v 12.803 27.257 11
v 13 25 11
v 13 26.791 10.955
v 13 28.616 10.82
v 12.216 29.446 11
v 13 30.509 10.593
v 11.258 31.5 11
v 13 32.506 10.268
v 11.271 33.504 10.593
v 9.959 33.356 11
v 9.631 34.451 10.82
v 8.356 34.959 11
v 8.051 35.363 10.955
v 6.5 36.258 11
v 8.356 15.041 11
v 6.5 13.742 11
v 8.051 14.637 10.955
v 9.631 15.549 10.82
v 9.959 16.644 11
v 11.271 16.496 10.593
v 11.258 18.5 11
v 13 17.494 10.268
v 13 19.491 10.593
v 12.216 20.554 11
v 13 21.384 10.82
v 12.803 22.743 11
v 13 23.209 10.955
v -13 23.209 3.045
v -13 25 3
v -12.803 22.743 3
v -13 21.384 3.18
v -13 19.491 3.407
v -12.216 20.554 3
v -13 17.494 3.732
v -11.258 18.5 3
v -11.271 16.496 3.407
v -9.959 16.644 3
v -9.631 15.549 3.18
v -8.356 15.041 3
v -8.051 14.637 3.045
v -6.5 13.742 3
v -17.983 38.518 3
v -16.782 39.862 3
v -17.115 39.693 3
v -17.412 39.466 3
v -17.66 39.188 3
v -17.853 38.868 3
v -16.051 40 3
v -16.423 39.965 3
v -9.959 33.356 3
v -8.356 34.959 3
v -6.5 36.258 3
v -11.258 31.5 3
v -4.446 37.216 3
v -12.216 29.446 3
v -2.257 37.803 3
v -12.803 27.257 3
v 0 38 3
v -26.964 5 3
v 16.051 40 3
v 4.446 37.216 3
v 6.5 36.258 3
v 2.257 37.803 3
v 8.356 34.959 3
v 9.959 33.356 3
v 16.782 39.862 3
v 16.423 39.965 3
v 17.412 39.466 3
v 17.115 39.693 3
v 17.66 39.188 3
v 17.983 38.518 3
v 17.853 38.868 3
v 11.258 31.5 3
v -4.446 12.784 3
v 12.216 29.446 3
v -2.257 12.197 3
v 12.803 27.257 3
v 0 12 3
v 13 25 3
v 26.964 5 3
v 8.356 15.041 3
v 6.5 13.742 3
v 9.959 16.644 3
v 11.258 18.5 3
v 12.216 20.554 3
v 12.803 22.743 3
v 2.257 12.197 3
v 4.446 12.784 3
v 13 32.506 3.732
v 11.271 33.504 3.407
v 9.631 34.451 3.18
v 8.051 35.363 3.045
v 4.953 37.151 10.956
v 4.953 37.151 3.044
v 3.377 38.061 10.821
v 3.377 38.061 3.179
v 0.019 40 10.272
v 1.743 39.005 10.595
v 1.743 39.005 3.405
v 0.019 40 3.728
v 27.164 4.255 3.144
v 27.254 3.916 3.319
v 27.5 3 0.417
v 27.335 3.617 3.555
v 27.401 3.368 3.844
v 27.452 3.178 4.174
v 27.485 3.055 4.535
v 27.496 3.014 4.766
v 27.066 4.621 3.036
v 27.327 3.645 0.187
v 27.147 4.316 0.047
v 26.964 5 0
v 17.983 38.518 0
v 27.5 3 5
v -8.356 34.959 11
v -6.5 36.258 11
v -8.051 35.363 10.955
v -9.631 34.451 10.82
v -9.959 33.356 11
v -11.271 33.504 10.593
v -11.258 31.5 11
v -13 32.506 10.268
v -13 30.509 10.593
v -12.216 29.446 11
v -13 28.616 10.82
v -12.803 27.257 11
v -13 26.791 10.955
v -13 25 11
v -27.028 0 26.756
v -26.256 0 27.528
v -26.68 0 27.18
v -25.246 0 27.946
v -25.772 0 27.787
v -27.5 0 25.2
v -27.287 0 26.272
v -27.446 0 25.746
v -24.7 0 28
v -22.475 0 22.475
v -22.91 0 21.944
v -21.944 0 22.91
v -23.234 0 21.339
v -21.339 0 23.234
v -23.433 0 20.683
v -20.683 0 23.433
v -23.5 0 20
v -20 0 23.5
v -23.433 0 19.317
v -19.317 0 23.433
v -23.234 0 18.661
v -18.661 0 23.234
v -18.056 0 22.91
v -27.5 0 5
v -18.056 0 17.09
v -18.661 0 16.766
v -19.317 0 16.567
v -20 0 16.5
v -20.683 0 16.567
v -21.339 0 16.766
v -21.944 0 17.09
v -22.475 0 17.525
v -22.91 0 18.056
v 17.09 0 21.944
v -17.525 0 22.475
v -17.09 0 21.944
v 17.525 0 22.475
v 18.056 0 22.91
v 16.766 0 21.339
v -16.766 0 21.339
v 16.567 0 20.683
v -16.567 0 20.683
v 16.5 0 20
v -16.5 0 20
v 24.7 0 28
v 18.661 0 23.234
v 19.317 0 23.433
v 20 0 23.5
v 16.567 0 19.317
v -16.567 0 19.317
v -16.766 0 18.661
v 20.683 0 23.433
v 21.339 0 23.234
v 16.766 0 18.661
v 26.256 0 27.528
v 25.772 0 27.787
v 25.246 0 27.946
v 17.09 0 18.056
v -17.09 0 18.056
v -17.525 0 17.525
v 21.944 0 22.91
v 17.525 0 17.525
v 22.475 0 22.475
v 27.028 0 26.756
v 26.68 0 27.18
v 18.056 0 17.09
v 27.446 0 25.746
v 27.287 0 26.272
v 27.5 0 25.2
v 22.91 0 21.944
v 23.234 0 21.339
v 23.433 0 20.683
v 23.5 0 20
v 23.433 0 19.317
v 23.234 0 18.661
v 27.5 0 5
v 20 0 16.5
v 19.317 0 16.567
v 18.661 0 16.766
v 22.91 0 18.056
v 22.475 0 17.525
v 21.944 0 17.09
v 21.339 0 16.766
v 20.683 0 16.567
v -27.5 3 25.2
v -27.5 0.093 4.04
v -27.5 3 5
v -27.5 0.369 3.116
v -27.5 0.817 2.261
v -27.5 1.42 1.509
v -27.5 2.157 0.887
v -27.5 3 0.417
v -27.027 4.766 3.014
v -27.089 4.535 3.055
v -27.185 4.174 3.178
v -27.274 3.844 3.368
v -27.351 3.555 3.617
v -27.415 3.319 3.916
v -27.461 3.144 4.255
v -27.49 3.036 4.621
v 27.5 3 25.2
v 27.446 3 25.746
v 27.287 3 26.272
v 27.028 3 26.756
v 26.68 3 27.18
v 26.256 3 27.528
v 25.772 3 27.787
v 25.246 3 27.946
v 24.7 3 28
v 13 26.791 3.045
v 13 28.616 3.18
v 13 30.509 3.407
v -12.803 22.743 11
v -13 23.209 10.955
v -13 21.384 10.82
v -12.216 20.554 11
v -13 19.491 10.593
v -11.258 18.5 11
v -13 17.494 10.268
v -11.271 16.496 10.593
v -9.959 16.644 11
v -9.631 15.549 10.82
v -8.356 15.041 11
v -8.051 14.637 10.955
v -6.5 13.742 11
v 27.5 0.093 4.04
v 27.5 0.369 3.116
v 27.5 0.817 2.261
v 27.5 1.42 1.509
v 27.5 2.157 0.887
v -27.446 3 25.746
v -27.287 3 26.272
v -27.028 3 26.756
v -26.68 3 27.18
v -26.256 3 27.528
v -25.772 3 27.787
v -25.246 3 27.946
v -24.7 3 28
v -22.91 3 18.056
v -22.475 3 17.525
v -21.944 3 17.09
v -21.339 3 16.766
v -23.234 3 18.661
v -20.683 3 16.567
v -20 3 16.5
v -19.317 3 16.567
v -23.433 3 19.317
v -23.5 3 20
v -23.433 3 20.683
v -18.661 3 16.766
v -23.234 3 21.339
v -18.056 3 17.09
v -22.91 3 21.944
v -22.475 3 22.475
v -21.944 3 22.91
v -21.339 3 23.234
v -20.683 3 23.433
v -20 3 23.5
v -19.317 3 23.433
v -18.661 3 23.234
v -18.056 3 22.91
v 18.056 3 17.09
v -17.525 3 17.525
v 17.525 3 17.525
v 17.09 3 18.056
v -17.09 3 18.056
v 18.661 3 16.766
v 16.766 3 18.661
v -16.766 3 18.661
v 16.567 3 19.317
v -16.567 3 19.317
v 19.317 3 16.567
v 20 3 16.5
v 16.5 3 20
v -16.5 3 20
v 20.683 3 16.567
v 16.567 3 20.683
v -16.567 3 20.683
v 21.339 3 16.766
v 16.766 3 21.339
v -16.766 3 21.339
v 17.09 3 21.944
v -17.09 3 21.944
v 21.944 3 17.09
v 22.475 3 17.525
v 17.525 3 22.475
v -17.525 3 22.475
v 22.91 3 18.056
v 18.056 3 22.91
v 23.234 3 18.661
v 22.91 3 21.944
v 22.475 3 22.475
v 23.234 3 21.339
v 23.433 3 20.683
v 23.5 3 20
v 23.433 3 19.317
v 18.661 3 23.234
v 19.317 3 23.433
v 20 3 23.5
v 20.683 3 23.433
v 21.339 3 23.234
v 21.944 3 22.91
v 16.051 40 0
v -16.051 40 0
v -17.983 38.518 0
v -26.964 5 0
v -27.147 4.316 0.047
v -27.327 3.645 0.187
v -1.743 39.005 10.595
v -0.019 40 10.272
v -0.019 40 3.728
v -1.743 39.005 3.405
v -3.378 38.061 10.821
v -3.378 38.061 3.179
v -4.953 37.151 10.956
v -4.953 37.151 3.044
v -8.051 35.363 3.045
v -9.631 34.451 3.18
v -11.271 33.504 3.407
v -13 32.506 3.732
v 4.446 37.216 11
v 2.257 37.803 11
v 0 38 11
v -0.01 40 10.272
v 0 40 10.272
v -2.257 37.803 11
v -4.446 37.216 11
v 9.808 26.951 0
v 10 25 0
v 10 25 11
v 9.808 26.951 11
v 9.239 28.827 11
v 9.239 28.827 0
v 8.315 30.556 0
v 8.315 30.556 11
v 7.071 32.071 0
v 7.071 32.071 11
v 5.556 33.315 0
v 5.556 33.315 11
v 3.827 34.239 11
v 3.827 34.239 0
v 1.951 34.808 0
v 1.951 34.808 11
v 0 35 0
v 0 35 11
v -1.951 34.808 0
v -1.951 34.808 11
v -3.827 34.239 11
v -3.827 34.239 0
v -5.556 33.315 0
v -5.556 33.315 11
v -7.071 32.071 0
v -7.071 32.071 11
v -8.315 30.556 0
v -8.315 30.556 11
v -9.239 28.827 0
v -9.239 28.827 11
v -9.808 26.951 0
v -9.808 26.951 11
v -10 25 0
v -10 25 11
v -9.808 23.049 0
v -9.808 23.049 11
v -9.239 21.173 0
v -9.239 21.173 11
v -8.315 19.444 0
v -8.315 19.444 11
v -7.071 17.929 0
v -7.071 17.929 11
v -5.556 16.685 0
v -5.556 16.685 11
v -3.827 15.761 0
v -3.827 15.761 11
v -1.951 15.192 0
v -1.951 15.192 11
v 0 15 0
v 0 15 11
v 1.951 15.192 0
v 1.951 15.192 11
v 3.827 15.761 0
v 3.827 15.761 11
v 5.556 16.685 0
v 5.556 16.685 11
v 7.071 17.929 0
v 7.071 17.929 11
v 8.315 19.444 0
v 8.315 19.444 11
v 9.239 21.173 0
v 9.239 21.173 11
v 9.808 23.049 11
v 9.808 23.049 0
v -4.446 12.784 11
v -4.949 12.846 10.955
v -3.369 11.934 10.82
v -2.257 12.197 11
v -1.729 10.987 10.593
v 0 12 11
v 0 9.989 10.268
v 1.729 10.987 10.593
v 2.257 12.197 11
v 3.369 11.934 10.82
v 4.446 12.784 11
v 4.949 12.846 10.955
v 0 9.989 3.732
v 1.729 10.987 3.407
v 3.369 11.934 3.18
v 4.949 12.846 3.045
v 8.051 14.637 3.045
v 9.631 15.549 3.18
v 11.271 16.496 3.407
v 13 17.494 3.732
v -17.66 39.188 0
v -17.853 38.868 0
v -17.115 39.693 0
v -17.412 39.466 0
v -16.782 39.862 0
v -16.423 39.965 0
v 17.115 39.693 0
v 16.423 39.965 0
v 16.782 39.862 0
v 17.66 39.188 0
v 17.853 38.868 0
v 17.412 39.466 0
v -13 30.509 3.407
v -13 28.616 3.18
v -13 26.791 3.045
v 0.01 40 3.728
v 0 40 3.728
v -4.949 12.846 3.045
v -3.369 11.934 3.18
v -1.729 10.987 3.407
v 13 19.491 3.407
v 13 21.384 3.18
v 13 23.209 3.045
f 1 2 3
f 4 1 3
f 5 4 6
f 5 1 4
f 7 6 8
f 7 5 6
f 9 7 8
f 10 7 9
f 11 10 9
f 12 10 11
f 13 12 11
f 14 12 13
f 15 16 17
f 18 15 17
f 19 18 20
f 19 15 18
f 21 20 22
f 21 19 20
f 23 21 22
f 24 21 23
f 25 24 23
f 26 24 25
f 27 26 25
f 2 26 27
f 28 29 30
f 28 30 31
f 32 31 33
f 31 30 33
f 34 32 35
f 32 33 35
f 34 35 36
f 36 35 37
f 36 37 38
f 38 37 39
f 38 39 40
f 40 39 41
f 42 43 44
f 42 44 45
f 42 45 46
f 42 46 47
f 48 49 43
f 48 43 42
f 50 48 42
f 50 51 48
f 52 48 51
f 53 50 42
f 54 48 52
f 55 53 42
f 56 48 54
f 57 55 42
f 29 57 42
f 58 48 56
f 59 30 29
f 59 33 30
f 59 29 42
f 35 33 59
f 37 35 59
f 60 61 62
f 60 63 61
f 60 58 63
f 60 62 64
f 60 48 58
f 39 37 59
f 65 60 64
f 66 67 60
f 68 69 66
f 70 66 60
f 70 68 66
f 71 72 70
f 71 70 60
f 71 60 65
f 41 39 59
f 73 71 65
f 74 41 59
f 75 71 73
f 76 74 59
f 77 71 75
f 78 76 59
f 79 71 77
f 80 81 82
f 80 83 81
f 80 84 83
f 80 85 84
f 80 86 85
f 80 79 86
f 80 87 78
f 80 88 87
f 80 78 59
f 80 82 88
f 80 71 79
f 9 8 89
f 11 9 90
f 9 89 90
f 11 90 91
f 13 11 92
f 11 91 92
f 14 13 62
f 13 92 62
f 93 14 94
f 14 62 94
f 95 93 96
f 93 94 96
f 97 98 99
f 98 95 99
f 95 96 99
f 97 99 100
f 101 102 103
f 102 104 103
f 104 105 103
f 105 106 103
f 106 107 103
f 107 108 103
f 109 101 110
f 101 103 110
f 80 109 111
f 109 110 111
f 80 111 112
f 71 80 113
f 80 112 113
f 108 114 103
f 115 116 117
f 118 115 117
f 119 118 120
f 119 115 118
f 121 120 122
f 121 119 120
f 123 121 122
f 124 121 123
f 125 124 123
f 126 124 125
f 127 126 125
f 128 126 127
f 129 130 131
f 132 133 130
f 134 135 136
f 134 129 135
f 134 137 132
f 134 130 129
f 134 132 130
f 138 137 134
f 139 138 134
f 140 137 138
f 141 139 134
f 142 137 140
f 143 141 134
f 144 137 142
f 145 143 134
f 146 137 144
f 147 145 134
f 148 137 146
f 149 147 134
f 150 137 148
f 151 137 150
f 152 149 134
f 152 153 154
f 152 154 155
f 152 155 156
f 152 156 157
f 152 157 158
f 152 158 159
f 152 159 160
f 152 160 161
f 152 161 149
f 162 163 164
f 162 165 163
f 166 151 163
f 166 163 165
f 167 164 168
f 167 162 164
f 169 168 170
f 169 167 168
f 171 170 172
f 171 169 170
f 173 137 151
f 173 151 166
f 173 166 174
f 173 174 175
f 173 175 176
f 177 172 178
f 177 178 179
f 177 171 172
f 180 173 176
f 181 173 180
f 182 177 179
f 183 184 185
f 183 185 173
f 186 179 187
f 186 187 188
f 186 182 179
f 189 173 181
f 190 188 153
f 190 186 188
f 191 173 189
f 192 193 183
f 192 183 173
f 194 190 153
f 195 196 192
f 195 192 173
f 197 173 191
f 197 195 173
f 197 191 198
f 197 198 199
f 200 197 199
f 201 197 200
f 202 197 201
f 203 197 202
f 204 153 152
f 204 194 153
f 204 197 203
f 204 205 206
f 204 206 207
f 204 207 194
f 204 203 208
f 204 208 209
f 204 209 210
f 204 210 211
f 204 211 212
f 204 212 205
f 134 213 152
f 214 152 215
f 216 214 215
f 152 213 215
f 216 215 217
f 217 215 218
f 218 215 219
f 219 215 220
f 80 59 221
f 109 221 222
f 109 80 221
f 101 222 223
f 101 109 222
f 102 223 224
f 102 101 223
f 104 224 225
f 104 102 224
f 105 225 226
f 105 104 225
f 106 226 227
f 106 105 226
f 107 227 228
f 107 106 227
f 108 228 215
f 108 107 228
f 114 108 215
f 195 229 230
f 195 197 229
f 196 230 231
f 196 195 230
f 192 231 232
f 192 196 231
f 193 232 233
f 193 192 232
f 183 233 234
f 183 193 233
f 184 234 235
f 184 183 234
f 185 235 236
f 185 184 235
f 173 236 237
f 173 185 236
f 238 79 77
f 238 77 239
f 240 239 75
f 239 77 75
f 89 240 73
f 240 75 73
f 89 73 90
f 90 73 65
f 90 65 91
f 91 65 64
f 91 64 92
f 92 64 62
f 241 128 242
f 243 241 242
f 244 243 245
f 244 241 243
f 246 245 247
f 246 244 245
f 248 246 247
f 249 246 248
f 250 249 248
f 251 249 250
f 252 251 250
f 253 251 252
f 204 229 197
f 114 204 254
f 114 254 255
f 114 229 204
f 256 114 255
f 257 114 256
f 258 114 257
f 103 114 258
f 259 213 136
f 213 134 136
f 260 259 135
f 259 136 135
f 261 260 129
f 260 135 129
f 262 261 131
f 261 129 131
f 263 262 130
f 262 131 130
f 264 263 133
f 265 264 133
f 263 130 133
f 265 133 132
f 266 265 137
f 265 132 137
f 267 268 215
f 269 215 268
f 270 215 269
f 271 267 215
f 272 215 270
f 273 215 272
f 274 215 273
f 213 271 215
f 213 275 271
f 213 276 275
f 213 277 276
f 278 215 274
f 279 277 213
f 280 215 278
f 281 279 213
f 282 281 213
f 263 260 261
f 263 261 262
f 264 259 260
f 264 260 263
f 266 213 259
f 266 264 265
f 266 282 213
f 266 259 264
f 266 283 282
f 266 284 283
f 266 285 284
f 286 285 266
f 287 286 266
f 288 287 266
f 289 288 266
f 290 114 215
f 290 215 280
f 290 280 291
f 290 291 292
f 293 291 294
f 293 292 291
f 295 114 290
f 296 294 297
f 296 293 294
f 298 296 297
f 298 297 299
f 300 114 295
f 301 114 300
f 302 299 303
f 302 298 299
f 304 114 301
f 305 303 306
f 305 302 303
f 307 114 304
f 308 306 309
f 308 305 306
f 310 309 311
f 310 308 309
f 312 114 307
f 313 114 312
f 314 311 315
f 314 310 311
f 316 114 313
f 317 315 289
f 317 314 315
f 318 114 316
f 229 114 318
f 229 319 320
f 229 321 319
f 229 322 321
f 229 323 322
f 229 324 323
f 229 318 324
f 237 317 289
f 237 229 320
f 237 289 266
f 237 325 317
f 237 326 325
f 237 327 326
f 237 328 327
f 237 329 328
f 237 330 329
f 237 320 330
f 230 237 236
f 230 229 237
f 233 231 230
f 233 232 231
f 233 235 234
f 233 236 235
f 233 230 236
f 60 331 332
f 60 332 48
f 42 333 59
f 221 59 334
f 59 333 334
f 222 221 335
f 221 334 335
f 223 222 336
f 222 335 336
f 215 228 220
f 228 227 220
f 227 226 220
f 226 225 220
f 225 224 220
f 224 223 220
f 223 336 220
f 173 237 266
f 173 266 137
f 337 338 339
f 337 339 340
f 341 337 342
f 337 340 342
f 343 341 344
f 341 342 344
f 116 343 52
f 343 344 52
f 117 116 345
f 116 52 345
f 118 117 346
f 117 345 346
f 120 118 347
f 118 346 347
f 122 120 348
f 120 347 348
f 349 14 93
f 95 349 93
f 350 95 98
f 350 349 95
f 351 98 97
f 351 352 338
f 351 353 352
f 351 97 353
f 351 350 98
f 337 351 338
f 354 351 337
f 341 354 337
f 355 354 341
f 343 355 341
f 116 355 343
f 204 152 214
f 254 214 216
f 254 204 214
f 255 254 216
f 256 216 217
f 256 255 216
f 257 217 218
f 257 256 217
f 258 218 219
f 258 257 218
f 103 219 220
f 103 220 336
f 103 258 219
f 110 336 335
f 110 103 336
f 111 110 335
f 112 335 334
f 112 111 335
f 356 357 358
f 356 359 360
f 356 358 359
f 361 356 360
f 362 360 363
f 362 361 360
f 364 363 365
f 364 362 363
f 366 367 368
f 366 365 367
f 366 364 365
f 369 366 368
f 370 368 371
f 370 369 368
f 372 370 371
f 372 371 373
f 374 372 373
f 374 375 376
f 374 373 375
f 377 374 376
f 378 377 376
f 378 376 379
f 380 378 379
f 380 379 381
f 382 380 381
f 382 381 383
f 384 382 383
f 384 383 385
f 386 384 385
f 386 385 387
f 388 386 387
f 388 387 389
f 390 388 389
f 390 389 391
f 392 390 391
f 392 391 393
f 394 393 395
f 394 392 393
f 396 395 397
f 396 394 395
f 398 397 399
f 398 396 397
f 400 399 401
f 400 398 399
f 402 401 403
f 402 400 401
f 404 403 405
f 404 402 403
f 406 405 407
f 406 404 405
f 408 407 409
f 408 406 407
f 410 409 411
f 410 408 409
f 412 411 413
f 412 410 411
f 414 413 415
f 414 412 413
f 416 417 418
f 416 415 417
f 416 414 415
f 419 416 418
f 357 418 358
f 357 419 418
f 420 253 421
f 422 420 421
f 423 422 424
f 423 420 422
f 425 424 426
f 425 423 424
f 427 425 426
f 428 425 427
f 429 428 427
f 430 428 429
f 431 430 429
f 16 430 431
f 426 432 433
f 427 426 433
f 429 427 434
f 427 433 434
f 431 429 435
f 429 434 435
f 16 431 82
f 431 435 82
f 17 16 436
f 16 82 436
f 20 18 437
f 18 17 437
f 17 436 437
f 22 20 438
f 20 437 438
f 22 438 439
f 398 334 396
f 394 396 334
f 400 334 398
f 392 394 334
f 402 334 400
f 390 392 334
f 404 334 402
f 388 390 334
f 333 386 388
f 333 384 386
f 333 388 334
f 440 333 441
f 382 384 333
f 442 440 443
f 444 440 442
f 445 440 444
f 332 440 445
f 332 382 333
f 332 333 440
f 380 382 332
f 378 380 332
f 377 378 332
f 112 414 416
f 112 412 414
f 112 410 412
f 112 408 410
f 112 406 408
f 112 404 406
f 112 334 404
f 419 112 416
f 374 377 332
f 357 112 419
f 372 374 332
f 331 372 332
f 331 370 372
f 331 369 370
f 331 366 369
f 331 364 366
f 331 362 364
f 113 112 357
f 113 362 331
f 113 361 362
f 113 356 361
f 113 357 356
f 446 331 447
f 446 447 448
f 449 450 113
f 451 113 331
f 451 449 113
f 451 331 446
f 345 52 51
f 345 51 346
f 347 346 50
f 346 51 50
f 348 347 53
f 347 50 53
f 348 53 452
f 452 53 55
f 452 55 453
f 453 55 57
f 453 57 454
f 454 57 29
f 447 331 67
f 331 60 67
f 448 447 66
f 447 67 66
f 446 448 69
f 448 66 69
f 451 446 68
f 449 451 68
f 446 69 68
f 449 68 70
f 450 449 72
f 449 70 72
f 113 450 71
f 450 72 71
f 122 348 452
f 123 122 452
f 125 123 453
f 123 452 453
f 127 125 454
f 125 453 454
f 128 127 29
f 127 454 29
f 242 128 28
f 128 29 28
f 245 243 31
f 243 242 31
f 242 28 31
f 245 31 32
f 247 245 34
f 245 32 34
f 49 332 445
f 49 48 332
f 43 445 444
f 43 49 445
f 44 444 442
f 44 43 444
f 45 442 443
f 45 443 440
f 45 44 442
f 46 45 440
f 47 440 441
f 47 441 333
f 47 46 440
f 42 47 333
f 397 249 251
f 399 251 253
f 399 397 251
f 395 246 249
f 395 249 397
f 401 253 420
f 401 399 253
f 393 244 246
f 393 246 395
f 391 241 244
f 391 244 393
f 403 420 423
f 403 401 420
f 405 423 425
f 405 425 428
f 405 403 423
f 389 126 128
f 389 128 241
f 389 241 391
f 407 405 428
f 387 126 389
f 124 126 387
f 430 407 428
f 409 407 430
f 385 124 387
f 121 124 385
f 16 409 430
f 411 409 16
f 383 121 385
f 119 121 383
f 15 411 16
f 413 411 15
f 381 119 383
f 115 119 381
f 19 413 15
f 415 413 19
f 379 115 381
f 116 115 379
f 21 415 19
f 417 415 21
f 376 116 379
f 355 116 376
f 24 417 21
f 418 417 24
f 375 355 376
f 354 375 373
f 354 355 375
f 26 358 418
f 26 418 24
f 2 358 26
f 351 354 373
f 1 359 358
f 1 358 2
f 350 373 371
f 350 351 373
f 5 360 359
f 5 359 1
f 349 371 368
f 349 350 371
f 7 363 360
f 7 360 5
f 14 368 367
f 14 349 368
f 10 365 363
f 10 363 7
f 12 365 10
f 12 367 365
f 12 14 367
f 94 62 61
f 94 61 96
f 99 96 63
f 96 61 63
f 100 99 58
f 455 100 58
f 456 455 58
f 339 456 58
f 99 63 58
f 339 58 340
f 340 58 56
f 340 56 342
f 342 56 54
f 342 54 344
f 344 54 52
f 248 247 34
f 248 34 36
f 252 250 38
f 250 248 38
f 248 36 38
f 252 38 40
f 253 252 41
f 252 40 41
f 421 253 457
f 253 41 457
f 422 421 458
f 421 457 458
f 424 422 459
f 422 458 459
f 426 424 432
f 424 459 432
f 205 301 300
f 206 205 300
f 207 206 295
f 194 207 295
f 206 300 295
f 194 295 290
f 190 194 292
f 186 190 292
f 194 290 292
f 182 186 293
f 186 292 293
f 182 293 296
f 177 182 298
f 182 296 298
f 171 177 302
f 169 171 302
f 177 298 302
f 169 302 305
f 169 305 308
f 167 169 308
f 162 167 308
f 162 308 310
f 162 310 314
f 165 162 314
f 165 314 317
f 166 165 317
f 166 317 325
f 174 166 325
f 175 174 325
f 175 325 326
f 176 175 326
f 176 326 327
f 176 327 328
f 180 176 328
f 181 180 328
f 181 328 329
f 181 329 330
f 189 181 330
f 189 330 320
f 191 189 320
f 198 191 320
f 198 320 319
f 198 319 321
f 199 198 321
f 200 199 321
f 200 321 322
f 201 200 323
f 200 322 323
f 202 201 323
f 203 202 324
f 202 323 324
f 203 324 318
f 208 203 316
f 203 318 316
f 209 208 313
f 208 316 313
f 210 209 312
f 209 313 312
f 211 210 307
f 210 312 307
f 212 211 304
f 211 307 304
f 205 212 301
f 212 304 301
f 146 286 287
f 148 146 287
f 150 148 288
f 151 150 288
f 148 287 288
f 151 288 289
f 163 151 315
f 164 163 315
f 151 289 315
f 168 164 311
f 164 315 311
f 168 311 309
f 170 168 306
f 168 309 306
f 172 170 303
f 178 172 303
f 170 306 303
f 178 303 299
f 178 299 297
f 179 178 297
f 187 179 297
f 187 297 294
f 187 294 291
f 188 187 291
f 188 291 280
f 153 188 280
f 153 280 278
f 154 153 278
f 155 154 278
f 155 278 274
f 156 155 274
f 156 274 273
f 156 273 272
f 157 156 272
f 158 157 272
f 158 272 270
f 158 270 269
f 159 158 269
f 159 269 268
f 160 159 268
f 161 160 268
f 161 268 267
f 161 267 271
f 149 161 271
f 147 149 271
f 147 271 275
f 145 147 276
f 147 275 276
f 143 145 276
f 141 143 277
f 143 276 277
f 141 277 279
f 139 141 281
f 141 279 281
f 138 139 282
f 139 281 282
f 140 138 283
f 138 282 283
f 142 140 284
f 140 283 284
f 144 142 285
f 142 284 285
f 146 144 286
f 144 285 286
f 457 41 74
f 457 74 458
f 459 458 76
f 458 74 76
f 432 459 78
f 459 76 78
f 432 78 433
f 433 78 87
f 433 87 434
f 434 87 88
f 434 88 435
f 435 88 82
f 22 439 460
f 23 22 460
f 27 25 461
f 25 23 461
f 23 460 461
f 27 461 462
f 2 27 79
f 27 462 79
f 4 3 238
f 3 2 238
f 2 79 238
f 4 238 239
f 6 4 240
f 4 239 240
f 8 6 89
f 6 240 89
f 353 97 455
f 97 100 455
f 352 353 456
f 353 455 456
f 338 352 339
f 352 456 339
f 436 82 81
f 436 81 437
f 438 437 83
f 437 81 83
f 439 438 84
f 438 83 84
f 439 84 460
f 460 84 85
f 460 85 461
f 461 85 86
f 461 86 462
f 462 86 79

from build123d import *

# Parameters (mm, degrees)
EXTRUDE_START            = 27.5
EXTRUDE_1_DEPTH          = 55
EXTRUDE_2_DEPTH          = 8
CUT_EXTRUDE_1_DEPTH      = 55.608961566
CUT_EXTRUDE_1_DEPTH_BACK = 55.608961566
SKETCH_4_R               = 10
CUT_EXTRUDE_2_DEPTH      = 55.608961566
CUT_EXTRUDE_2_DEPTH_BACK = 55.608961566
SKETCH_6_R               = 3.5
CUT_EXTRUDE_3_DEPTH      = 54.937463789
FILLET_1_R               = 2
FILLET_2_R               = 2.8


with BuildPart() as part:
    # 草图3 → 凸台-拉伸1 (new body)
    with BuildSketch(Plane(origin=(0, 0, 0), x_dir=(0, 0, -1), z_dir=(1, 0, 0)).offset(EXTRUDE_START)):
        with BuildLine():
            Line((-28, 0), (-5, 0))
            ThreePointArc((-5, 0), (-1.464466094, 1.464466094), (0, 5))
            Line((0, 5), (0, 40))
            Line((0, 40), (-3, 40))
            Line((-3, 40), (-3, 5))
            ThreePointArc((-3, 5), (-3.585786438, 3.585786438), (-5, 3))
            Line((-5, 3), (-28, 3))
            Line((-28, 3), (-28, 0))
        make_face()
    extrude(amount=-EXTRUDE_1_DEPTH)

    # 草图7 → 凸台-拉伸2 (add)
    with BuildSketch(Plane.XY.offset(3)):
        Polygon((0, 40.011106999), (-13, 32.505553499), (-13, 17.494446501), (0, 9.988893001), (13, 17.494446501), (13, 32.505553499), align=None)
    extrude(amount=EXTRUDE_2_DEPTH)

    # 草图4 → 切除-拉伸1 (cut, two sides: drawn at the far end of the back side and taken through both)
    with BuildSketch(Plane.XY.offset(3).offset(-CUT_EXTRUDE_1_DEPTH_BACK)):
        with Locations((0, 25)):
            Circle(SKETCH_4_R)
    extrude(amount=CUT_EXTRUDE_1_DEPTH + CUT_EXTRUDE_1_DEPTH_BACK, mode=Mode.SUBTRACT)

    # 草图8 → 切除-旋转1 (revolve, cut)
    with BuildSketch(Plane(origin=(0, 25, 0), x_dir=(-1, 0, 0), z_dir=(0, 1, 0))):
        Polygon((-13, 11), (-18, 11), (-18, 9.180148829), align=None)
        Polygon((-18, 3), (-18, 4.819851171), (-13, 3), align=None)
    revolve(axis=Axis((0, 25, 0), (0, 0, 1)), mode=Mode.SUBTRACT)

    # 草图5 → 切除-拉伸2 (cut, two sides: drawn at the far end of the back side and taken through both)
    with BuildSketch(Plane.XY.offset(3).offset(-CUT_EXTRUDE_2_DEPTH_BACK)):
        Polygon((-17.58587988, 40), (-27.5, 3), (-27.5, 50), (27.5, 50), (27.5, 3), (17.58587988, 40), align=None)
    extrude(amount=CUT_EXTRUDE_2_DEPTH + CUT_EXTRUDE_2_DEPTH_BACK, mode=Mode.SUBTRACT)

    # 草图6 → 切除-拉伸3 (cut, through all)
    with BuildSketch(Plane(origin=(0, 3, 0), x_dir=(1, 0, 0), z_dir=(0, 1, 0))):
        with Locations(Location((-20, -20, 0), (0, 0, 270))):
            Circle(SKETCH_6_R)
        with Locations(Location((20, -20, 0), (0, 0, 90))):
            Circle(SKETCH_6_R)
    extrude(amount=-CUT_EXTRUDE_3_DEPTH, mode=Mode.SUBTRACT)

    # 圆角1
    fillet_1_edges = [part.edges().sort_by_distance(p)[0] for p in [
        (17.58587988, 40, 1.5),
        (-17.58587988, 40, 1.5),
    ]]
    fillet(fillet_1_edges, radius=FILLET_1_R)

    # 圆角2
    fillet_2_edges = [part.edges().sort_by_distance(p)[0] for p in [
        (27.5, 1.5, 28),
        (-27.5, 1.5, 28),
    ]]
    fillet(fillet_2_edges, radius=FILLET_2_R)


solid = part.part
